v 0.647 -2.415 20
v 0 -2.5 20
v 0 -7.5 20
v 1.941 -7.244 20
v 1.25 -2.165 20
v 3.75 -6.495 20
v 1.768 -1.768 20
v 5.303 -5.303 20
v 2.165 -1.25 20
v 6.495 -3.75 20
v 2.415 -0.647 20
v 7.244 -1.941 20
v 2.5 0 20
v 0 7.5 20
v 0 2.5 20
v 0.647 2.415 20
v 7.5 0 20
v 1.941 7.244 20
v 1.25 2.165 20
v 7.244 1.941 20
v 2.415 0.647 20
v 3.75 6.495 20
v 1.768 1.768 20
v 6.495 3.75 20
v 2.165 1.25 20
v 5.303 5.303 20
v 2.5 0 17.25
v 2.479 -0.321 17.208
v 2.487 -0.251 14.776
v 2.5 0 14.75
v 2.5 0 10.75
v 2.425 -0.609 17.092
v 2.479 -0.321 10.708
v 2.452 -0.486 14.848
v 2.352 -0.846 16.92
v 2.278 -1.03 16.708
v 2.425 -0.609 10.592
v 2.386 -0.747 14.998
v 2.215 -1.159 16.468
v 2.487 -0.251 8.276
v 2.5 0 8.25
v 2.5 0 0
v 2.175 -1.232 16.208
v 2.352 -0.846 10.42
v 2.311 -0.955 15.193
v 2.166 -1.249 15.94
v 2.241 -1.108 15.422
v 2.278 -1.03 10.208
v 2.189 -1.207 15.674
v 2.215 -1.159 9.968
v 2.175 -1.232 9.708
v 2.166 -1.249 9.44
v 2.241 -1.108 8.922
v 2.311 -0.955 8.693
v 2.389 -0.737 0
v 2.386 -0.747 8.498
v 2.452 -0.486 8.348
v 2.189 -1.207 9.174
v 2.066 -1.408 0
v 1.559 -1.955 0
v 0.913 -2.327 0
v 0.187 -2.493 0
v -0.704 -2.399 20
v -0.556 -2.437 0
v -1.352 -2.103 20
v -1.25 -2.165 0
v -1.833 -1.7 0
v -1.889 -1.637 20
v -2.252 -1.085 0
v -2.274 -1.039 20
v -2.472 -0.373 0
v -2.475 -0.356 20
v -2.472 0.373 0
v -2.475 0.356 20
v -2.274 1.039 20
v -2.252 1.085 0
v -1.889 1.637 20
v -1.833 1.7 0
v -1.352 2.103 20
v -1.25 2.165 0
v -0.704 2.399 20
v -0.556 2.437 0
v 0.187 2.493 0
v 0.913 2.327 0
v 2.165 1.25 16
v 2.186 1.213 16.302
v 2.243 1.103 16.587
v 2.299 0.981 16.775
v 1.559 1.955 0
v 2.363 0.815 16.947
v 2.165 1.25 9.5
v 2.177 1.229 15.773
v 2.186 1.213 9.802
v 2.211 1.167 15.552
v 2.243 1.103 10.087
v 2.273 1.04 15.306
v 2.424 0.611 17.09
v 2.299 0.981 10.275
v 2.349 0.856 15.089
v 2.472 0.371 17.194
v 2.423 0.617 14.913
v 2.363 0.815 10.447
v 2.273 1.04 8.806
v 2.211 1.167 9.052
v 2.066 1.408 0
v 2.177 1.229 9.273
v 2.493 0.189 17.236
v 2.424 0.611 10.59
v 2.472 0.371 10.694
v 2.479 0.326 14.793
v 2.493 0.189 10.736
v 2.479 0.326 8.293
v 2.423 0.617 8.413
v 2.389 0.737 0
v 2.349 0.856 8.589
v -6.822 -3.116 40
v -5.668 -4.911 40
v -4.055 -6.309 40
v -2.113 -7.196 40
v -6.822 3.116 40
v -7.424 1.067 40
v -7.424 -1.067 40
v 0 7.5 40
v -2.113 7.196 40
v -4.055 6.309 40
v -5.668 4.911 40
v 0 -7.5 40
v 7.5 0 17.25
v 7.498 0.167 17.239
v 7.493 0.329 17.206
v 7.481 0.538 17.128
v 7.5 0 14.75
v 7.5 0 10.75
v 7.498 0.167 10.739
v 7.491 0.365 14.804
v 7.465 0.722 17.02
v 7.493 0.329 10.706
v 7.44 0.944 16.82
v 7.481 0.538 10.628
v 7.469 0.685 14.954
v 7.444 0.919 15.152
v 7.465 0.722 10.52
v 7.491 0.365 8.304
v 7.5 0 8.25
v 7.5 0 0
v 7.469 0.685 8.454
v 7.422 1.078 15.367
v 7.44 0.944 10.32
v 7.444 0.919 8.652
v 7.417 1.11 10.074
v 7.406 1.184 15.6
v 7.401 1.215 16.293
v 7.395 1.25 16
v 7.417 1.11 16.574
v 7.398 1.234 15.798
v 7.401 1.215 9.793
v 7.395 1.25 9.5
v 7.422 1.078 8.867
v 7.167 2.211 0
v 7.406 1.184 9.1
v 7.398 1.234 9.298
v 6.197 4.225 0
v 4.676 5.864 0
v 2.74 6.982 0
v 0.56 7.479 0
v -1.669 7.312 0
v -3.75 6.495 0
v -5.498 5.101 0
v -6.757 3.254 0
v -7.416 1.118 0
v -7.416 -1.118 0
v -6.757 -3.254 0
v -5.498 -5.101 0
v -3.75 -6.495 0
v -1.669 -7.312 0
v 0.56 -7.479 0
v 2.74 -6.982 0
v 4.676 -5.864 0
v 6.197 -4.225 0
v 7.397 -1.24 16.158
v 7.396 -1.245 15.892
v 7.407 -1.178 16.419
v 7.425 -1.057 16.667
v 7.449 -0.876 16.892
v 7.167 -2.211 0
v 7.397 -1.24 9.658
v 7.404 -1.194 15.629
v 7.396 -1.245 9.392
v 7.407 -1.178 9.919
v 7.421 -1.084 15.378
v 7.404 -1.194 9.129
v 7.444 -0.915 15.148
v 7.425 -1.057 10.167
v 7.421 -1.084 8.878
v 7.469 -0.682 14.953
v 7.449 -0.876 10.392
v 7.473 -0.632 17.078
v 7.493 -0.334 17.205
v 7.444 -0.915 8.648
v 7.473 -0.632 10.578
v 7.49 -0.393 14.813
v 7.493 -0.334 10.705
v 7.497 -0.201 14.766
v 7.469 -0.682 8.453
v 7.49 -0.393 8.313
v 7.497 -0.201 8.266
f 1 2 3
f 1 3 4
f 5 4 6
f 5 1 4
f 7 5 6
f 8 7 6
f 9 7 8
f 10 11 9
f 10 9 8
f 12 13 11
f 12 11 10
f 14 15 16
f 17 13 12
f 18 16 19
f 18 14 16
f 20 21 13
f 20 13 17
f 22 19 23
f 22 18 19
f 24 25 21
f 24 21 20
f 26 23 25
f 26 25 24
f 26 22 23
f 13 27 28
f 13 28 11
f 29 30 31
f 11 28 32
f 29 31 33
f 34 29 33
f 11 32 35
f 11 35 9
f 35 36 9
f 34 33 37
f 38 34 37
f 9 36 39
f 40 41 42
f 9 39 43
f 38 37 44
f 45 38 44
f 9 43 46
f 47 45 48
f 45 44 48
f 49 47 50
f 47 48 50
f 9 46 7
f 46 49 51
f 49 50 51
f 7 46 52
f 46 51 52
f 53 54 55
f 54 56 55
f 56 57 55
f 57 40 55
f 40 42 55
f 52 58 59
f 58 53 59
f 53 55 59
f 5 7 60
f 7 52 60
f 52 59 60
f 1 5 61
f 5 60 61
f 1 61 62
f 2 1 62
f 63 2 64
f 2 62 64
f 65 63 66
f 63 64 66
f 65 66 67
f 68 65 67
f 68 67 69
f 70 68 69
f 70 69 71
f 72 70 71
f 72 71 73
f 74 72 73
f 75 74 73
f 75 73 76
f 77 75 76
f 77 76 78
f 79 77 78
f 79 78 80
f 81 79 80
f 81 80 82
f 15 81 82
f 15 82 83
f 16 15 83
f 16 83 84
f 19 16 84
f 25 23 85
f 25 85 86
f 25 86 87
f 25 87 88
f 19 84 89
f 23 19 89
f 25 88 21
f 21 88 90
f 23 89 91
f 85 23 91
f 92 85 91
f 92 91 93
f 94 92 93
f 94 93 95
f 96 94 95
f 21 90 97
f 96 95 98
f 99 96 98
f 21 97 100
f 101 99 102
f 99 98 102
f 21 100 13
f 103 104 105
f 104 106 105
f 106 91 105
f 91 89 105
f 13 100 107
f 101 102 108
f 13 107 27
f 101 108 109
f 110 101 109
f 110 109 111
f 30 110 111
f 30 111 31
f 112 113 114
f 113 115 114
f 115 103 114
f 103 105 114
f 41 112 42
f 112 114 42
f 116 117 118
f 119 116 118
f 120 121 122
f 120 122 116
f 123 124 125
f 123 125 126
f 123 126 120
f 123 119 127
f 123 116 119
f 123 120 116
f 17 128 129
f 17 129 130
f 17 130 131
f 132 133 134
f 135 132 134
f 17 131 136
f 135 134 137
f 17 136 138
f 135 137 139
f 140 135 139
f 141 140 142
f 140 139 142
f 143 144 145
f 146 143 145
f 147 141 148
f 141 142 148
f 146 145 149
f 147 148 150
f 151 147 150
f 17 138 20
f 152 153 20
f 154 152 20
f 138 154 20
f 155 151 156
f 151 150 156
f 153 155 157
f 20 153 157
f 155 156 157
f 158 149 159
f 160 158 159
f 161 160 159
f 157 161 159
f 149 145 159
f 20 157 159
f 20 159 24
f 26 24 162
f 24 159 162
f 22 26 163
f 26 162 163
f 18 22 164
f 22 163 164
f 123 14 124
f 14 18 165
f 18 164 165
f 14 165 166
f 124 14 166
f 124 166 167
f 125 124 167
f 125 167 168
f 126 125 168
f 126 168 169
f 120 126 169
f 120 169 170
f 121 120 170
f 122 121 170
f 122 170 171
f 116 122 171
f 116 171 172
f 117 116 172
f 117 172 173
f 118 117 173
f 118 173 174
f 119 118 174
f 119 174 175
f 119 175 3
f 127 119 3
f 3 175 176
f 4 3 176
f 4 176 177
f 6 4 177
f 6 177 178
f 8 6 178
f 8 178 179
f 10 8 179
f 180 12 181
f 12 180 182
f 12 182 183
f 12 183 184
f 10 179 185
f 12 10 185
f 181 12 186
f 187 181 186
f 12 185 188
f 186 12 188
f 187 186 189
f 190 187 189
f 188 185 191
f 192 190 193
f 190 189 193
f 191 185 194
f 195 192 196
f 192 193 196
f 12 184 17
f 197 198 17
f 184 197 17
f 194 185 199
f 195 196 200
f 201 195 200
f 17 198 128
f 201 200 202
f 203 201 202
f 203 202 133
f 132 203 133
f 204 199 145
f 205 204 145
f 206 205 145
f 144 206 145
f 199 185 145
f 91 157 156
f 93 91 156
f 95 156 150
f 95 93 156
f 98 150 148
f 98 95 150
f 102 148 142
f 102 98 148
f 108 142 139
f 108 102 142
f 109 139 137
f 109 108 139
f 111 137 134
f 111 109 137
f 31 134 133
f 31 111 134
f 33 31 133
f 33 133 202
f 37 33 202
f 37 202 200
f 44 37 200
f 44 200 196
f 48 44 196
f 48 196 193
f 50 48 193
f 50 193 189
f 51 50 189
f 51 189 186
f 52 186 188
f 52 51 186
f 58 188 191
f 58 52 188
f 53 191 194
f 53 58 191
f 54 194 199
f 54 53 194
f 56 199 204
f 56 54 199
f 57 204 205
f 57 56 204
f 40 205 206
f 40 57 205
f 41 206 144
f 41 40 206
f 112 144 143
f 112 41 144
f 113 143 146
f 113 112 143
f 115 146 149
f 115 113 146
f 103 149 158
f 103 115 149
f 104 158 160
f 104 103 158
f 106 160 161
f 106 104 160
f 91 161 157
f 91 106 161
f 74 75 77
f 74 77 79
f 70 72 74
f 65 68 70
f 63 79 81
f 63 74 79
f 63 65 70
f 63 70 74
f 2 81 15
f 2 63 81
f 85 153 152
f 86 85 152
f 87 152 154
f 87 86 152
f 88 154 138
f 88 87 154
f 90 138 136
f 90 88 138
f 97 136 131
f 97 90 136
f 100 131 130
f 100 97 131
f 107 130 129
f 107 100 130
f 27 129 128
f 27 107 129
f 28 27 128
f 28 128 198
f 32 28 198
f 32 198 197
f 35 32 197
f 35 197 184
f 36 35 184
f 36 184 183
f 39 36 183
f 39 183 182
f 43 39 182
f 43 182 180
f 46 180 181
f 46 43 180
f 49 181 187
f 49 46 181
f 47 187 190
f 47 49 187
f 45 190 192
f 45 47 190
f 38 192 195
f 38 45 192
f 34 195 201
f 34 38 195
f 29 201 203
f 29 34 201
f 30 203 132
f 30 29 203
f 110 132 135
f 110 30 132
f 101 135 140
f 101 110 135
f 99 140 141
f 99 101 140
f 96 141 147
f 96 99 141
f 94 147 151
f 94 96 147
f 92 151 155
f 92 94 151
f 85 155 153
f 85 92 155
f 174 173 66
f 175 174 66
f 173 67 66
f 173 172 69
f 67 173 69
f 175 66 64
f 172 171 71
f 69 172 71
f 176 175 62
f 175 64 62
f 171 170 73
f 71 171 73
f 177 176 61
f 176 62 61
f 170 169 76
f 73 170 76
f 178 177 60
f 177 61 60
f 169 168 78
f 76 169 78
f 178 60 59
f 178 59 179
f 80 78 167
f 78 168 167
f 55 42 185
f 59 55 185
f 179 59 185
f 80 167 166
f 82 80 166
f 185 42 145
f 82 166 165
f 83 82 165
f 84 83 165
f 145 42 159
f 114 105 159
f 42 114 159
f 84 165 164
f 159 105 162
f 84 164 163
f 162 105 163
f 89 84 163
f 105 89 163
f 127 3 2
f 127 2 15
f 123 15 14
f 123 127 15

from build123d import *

# Parameters (mm, degrees)
F0_R     = 7.5
F1_DEPTH = 40
F2_W     = 31.443845
F2_H     = 29.544295
F3_DEPTH = 20
F4_R     = 2.5
F5_DEPTH = 20
F6_R     = 1.25
F7_DEPTH = 15


with BuildPart() as f1:
    # F0 (on Top) → F1 (new body)
    with BuildSketch(Plane.XY):
        Circle(F0_R)
    extrude(amount=F1_DEPTH)

    # F2 (on face) → F3 (cut)
    with BuildSketch(Plane.XY.offset(40)):
        with Locations((15.721922, -7.272147)):
            Rectangle(F2_W, F2_H)
    extrude(amount=-F3_DEPTH, mode=Mode.SUBTRACT)

    # F4 (on face) → F5 (cut)
    with BuildSketch(Plane(origin=(0, 0, 0), x_dir=(1, 0, 0), z_dir=(0, 0, -1))):
        Circle(F4_R)
    extrude(amount=-F5_DEPTH, mode=Mode.SUBTRACT)

    # F6 (on face) → F7 (cut)
    with BuildSketch(Plane.YZ):
        with Locations((0, 16)):
            Circle(F6_R)
        with Locations((0, 9.5)):
            Circle(F6_R)
    extrude(amount=F7_DEPTH, mode=Mode.SUBTRACT)


solid = f1.part
